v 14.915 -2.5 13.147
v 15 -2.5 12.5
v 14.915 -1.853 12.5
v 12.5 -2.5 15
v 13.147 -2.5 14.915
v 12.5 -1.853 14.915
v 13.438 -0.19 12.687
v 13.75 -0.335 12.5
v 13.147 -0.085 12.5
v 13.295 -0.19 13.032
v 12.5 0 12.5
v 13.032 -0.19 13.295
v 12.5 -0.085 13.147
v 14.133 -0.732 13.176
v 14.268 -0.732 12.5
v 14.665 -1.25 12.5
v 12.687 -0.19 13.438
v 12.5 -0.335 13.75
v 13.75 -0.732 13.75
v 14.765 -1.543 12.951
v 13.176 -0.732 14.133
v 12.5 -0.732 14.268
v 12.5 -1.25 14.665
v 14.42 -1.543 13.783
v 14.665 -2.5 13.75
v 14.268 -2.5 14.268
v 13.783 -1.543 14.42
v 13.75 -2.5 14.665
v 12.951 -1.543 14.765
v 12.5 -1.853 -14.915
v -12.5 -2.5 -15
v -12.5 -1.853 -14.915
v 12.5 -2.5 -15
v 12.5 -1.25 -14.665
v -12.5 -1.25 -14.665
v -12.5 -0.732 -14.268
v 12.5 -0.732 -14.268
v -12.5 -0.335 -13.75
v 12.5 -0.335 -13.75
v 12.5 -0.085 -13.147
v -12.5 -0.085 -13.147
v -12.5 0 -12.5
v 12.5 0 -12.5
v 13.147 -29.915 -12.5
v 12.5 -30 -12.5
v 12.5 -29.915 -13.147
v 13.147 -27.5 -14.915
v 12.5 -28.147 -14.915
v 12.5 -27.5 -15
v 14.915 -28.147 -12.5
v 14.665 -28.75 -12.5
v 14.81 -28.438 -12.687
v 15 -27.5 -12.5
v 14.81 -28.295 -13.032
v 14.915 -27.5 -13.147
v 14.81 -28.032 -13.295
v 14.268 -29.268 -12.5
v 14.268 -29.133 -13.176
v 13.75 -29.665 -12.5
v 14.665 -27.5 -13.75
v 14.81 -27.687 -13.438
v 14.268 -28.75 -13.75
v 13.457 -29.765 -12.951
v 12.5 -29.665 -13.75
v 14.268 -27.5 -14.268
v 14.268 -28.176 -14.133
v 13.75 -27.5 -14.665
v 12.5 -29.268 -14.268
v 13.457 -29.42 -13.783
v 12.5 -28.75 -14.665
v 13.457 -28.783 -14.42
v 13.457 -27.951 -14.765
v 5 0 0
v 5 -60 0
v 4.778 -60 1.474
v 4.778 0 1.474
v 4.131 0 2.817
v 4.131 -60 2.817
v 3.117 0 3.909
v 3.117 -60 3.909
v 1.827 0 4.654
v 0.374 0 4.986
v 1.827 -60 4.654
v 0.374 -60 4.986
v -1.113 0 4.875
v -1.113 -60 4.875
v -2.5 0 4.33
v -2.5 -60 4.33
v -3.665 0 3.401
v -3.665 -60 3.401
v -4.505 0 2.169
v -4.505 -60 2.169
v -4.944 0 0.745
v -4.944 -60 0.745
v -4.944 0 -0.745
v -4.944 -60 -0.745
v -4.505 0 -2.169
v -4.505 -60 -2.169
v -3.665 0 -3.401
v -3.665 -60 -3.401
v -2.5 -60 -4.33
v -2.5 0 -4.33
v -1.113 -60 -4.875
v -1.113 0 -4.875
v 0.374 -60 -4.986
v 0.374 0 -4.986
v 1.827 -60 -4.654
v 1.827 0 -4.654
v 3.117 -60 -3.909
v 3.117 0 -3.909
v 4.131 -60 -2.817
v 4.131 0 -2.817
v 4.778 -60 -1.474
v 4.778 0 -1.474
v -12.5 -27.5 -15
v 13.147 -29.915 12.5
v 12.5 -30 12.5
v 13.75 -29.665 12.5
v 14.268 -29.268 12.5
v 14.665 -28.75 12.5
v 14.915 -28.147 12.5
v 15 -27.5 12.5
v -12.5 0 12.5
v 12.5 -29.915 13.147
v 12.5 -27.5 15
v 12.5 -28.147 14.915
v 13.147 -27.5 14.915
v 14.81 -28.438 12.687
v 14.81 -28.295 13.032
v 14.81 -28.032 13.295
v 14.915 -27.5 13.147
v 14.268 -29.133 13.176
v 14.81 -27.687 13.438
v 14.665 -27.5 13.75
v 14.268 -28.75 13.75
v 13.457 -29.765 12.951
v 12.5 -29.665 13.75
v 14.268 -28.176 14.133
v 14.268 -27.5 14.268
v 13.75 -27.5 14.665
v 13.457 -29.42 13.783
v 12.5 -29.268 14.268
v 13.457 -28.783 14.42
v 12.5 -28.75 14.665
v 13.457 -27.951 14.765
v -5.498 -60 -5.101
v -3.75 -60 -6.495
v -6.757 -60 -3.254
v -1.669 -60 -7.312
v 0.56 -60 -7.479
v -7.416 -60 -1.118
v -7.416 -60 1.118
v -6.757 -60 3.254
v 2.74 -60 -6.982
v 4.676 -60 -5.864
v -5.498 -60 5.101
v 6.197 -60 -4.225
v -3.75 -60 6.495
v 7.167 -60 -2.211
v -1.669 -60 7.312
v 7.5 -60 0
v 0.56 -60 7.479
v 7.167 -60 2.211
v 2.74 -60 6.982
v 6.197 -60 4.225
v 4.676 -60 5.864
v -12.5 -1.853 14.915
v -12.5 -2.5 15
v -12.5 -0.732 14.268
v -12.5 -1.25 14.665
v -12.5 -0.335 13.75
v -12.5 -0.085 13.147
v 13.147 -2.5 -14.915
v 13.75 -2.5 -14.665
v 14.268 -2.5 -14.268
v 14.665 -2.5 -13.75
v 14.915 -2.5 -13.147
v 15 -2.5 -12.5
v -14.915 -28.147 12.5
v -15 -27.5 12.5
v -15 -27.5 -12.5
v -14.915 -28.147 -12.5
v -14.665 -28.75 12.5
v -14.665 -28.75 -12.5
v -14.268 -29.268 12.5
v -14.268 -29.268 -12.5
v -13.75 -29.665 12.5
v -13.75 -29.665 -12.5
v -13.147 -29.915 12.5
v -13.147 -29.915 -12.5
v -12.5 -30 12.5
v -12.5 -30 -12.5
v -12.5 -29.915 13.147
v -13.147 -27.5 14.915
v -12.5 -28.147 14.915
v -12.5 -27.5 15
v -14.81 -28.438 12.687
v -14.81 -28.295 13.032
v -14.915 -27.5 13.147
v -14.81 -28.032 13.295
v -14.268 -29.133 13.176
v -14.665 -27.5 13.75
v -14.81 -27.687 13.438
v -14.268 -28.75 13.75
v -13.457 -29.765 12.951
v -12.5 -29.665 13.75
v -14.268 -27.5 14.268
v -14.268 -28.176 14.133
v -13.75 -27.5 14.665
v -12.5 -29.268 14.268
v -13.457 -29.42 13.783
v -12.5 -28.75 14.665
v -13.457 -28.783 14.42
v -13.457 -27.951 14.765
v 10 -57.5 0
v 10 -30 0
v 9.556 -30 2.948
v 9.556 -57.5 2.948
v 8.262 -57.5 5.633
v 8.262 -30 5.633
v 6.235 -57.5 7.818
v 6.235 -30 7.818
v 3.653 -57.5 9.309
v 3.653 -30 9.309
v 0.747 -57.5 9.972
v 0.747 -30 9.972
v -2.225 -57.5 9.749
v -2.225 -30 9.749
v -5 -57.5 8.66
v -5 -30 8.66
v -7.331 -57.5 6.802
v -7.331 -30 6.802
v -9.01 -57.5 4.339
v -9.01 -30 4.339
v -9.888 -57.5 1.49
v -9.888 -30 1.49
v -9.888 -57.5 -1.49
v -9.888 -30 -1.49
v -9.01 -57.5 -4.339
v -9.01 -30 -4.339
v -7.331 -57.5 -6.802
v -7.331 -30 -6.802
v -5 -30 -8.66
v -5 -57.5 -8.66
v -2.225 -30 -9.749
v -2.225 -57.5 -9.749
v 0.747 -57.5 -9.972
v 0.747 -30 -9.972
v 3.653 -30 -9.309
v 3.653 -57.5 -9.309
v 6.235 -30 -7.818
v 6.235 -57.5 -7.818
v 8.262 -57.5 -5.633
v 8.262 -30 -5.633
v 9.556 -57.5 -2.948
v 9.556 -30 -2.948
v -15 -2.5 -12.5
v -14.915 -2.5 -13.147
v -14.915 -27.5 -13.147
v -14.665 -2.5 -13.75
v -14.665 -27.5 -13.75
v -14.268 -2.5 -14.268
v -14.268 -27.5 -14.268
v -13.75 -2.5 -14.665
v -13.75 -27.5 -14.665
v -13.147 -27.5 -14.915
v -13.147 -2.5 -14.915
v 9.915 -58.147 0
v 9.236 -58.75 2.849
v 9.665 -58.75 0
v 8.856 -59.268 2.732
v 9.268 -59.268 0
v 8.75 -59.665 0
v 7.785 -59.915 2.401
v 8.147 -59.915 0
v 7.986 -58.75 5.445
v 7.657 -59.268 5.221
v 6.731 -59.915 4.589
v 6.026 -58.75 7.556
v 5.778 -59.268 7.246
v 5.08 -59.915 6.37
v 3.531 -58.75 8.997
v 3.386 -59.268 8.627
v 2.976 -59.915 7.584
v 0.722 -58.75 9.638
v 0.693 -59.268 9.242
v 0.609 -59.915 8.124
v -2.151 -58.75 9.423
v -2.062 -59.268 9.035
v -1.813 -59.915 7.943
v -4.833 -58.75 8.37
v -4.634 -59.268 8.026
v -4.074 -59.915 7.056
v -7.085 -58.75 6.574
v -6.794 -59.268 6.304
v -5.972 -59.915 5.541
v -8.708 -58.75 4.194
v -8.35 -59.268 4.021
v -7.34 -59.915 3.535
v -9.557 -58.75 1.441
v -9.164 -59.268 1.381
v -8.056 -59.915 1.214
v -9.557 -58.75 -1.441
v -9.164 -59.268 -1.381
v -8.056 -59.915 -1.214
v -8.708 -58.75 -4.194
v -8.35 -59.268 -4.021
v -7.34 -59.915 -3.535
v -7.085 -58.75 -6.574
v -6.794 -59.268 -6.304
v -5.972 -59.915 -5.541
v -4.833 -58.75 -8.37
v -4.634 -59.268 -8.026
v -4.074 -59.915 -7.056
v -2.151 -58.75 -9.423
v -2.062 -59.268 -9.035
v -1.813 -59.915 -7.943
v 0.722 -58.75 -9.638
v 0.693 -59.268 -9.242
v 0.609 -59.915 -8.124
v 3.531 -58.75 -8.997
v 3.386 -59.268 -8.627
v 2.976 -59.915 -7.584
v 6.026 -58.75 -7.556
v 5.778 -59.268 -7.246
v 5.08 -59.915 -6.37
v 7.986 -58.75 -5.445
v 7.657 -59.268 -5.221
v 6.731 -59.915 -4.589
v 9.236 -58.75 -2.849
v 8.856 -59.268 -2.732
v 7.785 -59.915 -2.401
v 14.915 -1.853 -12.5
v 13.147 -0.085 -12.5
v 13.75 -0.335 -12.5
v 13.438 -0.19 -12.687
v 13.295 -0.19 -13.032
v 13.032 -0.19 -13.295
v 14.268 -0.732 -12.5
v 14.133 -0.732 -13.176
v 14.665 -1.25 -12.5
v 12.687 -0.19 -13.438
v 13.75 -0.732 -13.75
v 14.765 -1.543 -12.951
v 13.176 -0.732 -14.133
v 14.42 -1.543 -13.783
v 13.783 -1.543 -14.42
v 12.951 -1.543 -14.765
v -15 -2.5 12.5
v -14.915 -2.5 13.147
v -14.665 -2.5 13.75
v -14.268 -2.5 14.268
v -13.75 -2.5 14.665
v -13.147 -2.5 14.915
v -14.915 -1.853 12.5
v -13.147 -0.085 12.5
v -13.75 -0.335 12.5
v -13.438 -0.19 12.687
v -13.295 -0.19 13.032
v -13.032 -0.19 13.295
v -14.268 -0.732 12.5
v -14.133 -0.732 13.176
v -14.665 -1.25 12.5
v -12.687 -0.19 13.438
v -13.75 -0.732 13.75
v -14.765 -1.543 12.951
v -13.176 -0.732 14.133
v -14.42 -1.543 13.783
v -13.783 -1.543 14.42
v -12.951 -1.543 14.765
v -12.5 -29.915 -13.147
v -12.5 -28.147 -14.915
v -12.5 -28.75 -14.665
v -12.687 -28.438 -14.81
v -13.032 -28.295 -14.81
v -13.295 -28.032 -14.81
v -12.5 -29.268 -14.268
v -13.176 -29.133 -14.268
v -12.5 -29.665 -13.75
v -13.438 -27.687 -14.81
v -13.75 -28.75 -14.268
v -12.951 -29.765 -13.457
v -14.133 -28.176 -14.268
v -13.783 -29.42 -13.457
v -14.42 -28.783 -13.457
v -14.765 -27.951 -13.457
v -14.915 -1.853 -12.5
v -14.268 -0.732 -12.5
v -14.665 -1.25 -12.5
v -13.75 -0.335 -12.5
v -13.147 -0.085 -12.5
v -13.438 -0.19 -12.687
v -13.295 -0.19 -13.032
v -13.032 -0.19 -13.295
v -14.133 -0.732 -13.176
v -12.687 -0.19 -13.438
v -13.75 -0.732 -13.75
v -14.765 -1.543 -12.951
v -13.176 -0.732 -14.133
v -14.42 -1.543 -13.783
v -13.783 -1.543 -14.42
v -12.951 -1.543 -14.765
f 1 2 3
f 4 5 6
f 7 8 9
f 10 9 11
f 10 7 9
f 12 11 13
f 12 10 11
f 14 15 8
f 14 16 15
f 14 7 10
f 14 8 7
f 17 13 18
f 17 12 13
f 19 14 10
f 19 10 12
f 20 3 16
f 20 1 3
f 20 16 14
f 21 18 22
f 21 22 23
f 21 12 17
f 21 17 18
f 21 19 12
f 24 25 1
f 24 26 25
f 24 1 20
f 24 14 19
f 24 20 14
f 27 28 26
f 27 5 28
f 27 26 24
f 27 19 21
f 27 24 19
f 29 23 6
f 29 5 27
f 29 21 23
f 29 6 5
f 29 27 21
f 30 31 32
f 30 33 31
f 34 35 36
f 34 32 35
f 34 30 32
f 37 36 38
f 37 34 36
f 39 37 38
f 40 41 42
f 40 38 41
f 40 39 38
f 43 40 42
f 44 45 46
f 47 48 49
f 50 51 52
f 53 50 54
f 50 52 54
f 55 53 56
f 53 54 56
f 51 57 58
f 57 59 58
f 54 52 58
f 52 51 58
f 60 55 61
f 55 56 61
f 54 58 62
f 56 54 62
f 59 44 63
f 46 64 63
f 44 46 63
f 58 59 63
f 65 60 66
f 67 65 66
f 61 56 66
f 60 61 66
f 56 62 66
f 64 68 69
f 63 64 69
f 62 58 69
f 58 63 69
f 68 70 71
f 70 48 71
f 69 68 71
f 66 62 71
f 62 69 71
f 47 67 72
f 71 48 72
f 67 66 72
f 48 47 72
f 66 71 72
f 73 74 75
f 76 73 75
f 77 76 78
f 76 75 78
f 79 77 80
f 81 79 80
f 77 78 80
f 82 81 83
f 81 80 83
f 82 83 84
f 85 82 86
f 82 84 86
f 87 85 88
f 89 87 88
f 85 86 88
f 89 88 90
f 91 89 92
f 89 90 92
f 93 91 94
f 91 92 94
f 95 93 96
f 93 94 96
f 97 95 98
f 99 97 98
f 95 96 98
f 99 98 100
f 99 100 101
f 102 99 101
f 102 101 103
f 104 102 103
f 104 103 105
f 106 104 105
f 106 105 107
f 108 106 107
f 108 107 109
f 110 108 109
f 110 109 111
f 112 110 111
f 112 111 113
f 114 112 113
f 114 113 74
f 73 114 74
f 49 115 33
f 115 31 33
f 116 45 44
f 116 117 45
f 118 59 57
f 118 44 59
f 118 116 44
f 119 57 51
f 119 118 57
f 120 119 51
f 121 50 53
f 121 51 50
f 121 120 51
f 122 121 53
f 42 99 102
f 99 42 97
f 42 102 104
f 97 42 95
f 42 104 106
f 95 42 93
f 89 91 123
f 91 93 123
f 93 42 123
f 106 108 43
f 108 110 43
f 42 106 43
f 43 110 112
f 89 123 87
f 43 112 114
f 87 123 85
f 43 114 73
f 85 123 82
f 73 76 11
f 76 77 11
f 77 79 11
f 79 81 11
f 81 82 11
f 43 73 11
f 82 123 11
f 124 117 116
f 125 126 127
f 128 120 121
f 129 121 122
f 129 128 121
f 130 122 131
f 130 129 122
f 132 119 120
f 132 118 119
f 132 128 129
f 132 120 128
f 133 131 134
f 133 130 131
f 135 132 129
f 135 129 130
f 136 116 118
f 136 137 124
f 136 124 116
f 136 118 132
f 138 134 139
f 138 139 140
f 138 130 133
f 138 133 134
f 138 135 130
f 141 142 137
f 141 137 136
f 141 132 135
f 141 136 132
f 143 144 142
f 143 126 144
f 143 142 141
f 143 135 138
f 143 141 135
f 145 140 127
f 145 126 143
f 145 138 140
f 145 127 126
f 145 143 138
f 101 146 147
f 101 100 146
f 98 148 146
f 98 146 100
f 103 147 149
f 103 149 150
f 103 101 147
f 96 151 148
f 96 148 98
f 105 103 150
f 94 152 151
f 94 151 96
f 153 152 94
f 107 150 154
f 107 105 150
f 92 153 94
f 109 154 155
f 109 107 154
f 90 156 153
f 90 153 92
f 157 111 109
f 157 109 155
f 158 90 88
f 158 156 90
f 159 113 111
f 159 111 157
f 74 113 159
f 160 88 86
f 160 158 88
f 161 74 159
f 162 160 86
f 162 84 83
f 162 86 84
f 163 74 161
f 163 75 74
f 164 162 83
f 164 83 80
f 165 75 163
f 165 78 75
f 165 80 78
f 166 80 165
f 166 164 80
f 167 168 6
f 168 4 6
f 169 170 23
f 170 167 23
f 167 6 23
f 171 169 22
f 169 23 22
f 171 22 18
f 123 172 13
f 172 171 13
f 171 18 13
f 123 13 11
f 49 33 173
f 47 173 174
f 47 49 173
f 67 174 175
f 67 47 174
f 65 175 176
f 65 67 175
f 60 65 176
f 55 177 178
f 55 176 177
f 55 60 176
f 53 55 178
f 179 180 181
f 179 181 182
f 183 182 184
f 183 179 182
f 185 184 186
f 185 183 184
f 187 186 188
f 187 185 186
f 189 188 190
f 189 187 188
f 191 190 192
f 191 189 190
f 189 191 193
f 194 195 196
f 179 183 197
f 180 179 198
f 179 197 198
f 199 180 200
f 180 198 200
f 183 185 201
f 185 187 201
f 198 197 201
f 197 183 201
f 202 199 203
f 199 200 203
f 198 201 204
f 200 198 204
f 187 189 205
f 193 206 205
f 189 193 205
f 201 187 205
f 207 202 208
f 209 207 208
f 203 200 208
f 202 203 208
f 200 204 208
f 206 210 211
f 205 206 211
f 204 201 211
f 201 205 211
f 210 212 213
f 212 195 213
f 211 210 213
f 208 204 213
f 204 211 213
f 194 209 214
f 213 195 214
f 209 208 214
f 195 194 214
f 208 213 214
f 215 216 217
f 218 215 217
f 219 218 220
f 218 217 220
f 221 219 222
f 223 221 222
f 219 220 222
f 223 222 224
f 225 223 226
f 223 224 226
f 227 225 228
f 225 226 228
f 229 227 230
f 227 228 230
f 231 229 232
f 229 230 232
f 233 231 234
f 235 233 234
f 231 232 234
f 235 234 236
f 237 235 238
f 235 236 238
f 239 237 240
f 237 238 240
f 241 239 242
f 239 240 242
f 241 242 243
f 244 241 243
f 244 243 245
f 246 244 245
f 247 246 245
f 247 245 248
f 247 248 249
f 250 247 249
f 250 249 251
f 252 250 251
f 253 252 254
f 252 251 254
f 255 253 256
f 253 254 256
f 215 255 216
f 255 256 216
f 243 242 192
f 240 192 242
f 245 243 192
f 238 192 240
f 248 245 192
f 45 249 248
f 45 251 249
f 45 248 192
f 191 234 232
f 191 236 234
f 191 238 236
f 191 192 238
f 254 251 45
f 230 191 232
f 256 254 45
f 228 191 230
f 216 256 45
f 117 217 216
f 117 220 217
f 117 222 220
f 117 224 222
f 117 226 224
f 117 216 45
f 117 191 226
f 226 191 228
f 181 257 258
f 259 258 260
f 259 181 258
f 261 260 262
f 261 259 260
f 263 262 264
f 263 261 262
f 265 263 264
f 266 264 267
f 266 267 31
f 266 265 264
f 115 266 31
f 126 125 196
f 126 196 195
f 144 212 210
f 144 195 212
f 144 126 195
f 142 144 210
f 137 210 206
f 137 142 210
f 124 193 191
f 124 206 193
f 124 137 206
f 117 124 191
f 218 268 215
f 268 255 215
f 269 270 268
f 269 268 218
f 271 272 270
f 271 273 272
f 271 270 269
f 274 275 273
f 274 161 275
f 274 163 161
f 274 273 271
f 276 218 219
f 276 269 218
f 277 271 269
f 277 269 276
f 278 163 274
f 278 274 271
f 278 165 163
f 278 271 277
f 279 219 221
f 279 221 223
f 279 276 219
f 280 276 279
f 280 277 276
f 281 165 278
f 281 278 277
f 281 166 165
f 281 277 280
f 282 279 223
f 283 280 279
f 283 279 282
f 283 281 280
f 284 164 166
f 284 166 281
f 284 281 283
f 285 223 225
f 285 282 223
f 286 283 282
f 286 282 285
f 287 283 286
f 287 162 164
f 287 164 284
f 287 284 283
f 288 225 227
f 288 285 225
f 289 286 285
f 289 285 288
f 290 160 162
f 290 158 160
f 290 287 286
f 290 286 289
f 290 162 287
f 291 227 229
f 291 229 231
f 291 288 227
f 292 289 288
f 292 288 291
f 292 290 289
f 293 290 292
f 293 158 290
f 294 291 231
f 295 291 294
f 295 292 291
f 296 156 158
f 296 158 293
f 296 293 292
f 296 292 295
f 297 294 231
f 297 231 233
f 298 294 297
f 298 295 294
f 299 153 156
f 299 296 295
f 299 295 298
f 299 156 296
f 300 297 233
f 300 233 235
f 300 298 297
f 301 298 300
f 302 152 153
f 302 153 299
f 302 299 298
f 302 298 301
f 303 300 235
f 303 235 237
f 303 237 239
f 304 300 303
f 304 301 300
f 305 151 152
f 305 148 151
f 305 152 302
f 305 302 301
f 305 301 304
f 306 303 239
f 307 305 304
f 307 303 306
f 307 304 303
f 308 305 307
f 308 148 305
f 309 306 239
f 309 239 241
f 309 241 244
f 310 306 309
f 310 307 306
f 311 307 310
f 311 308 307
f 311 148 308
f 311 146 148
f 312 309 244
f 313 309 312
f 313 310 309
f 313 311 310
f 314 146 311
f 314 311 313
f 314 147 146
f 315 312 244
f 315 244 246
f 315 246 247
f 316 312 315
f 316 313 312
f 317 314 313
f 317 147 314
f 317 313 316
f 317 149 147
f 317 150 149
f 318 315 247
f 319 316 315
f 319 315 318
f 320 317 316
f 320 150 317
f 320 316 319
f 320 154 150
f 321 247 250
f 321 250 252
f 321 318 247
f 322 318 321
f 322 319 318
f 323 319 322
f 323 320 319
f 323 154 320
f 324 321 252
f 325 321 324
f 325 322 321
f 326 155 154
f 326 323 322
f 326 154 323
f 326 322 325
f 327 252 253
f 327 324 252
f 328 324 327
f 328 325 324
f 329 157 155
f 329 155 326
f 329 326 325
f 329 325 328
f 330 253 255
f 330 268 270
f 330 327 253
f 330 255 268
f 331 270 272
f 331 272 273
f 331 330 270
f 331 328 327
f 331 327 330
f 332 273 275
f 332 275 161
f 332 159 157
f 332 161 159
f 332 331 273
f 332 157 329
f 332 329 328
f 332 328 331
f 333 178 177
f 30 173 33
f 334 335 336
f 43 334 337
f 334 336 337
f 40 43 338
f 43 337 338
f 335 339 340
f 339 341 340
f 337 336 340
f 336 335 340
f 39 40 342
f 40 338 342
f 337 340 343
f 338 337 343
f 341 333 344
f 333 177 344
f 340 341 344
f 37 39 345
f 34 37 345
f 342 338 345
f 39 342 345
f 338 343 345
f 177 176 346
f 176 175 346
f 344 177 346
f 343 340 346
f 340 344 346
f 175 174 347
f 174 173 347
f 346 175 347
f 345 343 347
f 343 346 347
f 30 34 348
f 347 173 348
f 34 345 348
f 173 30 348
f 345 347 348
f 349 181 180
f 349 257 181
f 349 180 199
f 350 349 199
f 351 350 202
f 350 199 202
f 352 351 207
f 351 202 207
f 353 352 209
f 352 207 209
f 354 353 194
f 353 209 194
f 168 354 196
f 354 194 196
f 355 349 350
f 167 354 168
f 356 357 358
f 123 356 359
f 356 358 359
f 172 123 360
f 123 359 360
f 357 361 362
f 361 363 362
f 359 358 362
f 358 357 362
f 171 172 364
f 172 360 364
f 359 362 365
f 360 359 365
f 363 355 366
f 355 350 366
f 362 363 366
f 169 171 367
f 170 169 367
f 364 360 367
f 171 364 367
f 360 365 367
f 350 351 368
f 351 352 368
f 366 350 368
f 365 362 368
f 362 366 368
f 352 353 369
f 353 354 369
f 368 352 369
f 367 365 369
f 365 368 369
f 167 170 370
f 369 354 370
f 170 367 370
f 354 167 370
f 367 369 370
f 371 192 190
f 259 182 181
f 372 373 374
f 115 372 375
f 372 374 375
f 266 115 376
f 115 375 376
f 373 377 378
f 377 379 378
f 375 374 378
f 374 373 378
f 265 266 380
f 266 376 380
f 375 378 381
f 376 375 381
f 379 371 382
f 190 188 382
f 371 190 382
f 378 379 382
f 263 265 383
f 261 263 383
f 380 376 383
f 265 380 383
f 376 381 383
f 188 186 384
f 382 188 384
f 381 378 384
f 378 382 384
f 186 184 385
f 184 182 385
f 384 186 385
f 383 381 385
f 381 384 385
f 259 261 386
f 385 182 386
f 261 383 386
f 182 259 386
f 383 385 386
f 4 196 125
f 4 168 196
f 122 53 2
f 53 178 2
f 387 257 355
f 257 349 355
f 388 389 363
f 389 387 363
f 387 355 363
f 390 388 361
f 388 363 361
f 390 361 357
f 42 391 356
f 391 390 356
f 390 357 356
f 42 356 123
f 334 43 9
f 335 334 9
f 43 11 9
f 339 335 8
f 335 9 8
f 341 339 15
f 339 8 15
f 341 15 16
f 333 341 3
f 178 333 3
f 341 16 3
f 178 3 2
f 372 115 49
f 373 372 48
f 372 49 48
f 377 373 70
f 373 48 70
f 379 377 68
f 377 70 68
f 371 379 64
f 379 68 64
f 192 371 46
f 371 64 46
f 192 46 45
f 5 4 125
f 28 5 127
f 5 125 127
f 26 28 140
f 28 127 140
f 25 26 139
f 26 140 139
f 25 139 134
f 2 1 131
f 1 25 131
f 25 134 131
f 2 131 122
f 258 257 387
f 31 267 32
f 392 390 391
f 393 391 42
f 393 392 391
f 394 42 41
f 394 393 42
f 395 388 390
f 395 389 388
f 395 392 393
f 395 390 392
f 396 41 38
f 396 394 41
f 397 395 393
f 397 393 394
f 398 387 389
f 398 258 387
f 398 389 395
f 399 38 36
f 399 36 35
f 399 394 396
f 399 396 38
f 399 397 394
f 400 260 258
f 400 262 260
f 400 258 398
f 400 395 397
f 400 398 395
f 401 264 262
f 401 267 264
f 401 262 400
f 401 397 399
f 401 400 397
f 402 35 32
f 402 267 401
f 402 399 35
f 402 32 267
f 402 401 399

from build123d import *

# Parameters (mm, degrees)
F0_W     = 30
F0_H     = 30
F1_DEPTH = 30
F2_R     = 10
F3_DEPTH = 30
F4_R     = 2.5
F5_R     = 5
F6_DEPTH = 60.001


with BuildPart() as f1:
    # F0 (on Front) → F1 (new body)
    with BuildSketch(Plane.XZ):
        Rectangle(F0_W, F0_H)
    extrude(amount=F1_DEPTH)

    # F2 (on face) → F3 (join)
    with BuildSketch(Plane.XZ.offset(30)):
        Circle(F2_R)
    extrude(amount=F3_DEPTH)

    # F4
    f4_edges = [f1.edges().sort_by_distance(p)[0] for p in [
        (0, -30, 15),
        (-15, -30, 0),
        (0, -30, -15),
        (15, -30, 0),
        (-10, -60, 0),
        (-15, -15, 15),
        (-15, -15, -15),
        (-15, 0, 0),
        (15, -15, 15),
        (15, -15, -15),
        (15, 0, 0),
        (0, 0, 15),
        (0, 0, -15),
    ]]
    fillet(f4_edges, radius=F4_R)

    # F5 (on face) → F6 (cut, through all)
    with BuildSketch(Plane.XZ.offset(60)):
        Circle(F5_R)
    extrude(amount=-F6_DEPTH, mode=Mode.SUBTRACT)


solid = f1.part
